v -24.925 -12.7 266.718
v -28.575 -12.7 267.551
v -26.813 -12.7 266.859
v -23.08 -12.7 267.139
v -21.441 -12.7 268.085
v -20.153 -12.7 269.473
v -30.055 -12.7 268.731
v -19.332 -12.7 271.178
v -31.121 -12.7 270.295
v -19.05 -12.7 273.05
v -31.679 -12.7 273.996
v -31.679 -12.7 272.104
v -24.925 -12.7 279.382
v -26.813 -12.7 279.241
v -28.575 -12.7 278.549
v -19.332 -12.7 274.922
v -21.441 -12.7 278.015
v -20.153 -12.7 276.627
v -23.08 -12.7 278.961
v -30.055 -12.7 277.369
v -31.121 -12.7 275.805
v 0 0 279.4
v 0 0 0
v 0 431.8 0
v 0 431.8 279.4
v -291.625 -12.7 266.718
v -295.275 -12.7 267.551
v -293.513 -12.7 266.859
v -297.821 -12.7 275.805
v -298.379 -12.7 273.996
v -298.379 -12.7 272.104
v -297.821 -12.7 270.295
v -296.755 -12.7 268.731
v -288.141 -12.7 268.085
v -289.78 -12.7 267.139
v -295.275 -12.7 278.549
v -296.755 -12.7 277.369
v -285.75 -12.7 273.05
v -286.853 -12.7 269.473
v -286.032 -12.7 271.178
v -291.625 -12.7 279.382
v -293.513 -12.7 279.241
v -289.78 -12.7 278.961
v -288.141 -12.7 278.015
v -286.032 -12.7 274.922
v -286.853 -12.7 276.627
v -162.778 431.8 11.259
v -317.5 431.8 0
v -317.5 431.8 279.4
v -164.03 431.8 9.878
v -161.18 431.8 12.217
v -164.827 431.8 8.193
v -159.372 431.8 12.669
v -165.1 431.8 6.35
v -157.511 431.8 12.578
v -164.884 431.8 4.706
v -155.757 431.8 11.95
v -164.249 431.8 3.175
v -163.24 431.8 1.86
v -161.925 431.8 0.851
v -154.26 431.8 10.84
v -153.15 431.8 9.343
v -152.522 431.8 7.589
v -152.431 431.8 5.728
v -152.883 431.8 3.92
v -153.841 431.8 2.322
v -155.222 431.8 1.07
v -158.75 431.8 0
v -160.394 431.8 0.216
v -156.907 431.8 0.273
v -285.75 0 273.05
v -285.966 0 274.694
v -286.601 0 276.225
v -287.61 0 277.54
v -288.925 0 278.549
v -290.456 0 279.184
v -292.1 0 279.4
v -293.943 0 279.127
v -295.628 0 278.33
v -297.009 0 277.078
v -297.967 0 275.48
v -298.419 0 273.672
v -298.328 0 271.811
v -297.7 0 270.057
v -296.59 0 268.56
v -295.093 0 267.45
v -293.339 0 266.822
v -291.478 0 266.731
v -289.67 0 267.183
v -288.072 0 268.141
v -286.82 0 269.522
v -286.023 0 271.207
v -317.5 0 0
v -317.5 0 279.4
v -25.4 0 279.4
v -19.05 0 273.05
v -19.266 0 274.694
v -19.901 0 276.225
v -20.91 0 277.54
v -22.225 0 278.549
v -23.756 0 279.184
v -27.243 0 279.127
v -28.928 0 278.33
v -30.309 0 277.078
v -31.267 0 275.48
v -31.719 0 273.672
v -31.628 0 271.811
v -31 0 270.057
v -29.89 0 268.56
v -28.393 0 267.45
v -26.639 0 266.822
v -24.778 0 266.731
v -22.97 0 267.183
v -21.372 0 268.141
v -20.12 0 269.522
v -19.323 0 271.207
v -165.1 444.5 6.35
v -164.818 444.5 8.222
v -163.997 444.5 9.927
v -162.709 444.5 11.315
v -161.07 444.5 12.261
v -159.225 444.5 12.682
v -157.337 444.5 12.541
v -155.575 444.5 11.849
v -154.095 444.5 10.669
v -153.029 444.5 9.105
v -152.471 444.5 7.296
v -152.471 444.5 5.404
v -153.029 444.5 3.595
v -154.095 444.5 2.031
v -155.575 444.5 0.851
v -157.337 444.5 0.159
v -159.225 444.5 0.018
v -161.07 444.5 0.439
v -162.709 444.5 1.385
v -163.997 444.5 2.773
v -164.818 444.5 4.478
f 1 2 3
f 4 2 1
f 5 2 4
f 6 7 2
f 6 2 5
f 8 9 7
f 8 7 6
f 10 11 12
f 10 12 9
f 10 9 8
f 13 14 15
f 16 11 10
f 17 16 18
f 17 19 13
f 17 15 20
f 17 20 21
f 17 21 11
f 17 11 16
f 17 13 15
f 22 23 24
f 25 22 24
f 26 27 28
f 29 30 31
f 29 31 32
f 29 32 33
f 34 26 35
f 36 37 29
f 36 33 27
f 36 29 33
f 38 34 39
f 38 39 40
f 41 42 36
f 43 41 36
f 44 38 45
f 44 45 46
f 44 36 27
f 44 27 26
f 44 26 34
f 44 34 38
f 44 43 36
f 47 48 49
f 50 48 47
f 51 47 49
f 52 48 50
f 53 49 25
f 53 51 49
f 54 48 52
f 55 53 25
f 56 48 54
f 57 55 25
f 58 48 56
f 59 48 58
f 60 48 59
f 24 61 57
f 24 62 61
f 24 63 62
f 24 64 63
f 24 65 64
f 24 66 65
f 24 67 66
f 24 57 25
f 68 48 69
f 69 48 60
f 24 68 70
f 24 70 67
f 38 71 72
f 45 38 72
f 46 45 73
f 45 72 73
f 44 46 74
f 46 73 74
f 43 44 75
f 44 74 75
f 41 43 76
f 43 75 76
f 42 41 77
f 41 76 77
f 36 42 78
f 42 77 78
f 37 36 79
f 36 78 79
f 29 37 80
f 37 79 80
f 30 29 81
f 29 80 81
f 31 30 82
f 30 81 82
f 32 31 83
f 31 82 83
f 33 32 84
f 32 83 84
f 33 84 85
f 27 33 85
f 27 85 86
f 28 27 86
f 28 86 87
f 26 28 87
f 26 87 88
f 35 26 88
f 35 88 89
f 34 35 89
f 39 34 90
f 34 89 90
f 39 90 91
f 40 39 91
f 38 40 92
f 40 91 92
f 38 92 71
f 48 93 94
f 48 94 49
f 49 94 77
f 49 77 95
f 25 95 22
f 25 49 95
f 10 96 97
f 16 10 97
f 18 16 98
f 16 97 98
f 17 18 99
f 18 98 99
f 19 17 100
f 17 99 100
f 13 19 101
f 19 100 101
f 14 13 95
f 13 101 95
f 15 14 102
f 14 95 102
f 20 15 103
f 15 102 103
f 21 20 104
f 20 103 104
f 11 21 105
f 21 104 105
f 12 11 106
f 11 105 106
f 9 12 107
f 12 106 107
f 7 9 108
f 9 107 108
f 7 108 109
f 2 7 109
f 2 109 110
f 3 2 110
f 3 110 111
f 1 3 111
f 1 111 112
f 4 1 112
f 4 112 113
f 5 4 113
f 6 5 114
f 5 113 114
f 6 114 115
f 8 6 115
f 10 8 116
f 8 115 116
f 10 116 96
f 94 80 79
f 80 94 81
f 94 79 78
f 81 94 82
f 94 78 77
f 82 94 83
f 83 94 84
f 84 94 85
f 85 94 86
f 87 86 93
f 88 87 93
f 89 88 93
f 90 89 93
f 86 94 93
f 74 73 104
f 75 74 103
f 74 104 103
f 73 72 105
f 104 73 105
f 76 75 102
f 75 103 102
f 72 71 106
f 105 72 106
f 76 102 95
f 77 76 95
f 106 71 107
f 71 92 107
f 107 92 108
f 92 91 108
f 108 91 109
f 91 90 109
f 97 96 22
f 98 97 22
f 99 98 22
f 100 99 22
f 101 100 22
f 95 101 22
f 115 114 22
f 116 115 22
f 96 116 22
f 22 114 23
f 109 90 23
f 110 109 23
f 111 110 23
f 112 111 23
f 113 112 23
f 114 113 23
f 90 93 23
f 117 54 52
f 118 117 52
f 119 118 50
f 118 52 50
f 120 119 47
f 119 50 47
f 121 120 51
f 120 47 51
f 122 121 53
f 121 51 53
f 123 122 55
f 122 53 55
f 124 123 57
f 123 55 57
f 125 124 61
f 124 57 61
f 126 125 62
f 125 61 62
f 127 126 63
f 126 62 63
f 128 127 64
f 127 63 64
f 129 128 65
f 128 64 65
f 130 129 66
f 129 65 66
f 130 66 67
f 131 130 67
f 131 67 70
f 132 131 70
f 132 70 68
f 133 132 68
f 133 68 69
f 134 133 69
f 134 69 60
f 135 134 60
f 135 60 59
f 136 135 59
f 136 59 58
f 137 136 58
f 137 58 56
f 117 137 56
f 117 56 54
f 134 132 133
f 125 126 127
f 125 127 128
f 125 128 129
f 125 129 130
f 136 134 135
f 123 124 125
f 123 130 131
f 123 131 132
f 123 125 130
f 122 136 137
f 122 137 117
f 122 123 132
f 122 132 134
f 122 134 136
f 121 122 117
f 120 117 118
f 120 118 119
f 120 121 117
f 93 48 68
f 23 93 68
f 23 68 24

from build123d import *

# Parameters (mm, degrees)
F0_W     = 317.5
F0_H     = 431.8
F1_DEPTH = 279.4
F2_R     = 6.35
F3_DEPTH = 12.7
F4_R     = 6.35
F5_DEPTH = 12.7


with BuildPart() as f1:
    # F0 (on Top) → F1 (new body)
    with BuildSketch(Plane.XY):
        with Locations((-158.75, 215.9)):
            Rectangle(F0_W, F0_H)
    extrude(amount=F1_DEPTH)

    # F2 (on face) → F3 (join)
    with BuildSketch(Plane(origin=(0, 431.8, 0), x_dir=(-1, 0, 0), z_dir=(0, 1, 0))):
        with Locations((158.75, 6.35)):
            Circle(F2_R)
    extrude(amount=F3_DEPTH)

    # F4 (on face) → F5 (join)
    with BuildSketch(Plane.XZ):
        with BuildLine():
            ThreePointArc((-298.45, 273.05), (-292.1, 266.7), (-285.75, 273.05))
            ThreePointArc((-285.75, 273.05), (-292.1, 279.4), (-298.45, 273.05))
        make_face()
        with Locations((-25.4, 273.05)):
            Circle(F4_R)
    extrude(amount=F5_DEPTH)


solid = f1.part
